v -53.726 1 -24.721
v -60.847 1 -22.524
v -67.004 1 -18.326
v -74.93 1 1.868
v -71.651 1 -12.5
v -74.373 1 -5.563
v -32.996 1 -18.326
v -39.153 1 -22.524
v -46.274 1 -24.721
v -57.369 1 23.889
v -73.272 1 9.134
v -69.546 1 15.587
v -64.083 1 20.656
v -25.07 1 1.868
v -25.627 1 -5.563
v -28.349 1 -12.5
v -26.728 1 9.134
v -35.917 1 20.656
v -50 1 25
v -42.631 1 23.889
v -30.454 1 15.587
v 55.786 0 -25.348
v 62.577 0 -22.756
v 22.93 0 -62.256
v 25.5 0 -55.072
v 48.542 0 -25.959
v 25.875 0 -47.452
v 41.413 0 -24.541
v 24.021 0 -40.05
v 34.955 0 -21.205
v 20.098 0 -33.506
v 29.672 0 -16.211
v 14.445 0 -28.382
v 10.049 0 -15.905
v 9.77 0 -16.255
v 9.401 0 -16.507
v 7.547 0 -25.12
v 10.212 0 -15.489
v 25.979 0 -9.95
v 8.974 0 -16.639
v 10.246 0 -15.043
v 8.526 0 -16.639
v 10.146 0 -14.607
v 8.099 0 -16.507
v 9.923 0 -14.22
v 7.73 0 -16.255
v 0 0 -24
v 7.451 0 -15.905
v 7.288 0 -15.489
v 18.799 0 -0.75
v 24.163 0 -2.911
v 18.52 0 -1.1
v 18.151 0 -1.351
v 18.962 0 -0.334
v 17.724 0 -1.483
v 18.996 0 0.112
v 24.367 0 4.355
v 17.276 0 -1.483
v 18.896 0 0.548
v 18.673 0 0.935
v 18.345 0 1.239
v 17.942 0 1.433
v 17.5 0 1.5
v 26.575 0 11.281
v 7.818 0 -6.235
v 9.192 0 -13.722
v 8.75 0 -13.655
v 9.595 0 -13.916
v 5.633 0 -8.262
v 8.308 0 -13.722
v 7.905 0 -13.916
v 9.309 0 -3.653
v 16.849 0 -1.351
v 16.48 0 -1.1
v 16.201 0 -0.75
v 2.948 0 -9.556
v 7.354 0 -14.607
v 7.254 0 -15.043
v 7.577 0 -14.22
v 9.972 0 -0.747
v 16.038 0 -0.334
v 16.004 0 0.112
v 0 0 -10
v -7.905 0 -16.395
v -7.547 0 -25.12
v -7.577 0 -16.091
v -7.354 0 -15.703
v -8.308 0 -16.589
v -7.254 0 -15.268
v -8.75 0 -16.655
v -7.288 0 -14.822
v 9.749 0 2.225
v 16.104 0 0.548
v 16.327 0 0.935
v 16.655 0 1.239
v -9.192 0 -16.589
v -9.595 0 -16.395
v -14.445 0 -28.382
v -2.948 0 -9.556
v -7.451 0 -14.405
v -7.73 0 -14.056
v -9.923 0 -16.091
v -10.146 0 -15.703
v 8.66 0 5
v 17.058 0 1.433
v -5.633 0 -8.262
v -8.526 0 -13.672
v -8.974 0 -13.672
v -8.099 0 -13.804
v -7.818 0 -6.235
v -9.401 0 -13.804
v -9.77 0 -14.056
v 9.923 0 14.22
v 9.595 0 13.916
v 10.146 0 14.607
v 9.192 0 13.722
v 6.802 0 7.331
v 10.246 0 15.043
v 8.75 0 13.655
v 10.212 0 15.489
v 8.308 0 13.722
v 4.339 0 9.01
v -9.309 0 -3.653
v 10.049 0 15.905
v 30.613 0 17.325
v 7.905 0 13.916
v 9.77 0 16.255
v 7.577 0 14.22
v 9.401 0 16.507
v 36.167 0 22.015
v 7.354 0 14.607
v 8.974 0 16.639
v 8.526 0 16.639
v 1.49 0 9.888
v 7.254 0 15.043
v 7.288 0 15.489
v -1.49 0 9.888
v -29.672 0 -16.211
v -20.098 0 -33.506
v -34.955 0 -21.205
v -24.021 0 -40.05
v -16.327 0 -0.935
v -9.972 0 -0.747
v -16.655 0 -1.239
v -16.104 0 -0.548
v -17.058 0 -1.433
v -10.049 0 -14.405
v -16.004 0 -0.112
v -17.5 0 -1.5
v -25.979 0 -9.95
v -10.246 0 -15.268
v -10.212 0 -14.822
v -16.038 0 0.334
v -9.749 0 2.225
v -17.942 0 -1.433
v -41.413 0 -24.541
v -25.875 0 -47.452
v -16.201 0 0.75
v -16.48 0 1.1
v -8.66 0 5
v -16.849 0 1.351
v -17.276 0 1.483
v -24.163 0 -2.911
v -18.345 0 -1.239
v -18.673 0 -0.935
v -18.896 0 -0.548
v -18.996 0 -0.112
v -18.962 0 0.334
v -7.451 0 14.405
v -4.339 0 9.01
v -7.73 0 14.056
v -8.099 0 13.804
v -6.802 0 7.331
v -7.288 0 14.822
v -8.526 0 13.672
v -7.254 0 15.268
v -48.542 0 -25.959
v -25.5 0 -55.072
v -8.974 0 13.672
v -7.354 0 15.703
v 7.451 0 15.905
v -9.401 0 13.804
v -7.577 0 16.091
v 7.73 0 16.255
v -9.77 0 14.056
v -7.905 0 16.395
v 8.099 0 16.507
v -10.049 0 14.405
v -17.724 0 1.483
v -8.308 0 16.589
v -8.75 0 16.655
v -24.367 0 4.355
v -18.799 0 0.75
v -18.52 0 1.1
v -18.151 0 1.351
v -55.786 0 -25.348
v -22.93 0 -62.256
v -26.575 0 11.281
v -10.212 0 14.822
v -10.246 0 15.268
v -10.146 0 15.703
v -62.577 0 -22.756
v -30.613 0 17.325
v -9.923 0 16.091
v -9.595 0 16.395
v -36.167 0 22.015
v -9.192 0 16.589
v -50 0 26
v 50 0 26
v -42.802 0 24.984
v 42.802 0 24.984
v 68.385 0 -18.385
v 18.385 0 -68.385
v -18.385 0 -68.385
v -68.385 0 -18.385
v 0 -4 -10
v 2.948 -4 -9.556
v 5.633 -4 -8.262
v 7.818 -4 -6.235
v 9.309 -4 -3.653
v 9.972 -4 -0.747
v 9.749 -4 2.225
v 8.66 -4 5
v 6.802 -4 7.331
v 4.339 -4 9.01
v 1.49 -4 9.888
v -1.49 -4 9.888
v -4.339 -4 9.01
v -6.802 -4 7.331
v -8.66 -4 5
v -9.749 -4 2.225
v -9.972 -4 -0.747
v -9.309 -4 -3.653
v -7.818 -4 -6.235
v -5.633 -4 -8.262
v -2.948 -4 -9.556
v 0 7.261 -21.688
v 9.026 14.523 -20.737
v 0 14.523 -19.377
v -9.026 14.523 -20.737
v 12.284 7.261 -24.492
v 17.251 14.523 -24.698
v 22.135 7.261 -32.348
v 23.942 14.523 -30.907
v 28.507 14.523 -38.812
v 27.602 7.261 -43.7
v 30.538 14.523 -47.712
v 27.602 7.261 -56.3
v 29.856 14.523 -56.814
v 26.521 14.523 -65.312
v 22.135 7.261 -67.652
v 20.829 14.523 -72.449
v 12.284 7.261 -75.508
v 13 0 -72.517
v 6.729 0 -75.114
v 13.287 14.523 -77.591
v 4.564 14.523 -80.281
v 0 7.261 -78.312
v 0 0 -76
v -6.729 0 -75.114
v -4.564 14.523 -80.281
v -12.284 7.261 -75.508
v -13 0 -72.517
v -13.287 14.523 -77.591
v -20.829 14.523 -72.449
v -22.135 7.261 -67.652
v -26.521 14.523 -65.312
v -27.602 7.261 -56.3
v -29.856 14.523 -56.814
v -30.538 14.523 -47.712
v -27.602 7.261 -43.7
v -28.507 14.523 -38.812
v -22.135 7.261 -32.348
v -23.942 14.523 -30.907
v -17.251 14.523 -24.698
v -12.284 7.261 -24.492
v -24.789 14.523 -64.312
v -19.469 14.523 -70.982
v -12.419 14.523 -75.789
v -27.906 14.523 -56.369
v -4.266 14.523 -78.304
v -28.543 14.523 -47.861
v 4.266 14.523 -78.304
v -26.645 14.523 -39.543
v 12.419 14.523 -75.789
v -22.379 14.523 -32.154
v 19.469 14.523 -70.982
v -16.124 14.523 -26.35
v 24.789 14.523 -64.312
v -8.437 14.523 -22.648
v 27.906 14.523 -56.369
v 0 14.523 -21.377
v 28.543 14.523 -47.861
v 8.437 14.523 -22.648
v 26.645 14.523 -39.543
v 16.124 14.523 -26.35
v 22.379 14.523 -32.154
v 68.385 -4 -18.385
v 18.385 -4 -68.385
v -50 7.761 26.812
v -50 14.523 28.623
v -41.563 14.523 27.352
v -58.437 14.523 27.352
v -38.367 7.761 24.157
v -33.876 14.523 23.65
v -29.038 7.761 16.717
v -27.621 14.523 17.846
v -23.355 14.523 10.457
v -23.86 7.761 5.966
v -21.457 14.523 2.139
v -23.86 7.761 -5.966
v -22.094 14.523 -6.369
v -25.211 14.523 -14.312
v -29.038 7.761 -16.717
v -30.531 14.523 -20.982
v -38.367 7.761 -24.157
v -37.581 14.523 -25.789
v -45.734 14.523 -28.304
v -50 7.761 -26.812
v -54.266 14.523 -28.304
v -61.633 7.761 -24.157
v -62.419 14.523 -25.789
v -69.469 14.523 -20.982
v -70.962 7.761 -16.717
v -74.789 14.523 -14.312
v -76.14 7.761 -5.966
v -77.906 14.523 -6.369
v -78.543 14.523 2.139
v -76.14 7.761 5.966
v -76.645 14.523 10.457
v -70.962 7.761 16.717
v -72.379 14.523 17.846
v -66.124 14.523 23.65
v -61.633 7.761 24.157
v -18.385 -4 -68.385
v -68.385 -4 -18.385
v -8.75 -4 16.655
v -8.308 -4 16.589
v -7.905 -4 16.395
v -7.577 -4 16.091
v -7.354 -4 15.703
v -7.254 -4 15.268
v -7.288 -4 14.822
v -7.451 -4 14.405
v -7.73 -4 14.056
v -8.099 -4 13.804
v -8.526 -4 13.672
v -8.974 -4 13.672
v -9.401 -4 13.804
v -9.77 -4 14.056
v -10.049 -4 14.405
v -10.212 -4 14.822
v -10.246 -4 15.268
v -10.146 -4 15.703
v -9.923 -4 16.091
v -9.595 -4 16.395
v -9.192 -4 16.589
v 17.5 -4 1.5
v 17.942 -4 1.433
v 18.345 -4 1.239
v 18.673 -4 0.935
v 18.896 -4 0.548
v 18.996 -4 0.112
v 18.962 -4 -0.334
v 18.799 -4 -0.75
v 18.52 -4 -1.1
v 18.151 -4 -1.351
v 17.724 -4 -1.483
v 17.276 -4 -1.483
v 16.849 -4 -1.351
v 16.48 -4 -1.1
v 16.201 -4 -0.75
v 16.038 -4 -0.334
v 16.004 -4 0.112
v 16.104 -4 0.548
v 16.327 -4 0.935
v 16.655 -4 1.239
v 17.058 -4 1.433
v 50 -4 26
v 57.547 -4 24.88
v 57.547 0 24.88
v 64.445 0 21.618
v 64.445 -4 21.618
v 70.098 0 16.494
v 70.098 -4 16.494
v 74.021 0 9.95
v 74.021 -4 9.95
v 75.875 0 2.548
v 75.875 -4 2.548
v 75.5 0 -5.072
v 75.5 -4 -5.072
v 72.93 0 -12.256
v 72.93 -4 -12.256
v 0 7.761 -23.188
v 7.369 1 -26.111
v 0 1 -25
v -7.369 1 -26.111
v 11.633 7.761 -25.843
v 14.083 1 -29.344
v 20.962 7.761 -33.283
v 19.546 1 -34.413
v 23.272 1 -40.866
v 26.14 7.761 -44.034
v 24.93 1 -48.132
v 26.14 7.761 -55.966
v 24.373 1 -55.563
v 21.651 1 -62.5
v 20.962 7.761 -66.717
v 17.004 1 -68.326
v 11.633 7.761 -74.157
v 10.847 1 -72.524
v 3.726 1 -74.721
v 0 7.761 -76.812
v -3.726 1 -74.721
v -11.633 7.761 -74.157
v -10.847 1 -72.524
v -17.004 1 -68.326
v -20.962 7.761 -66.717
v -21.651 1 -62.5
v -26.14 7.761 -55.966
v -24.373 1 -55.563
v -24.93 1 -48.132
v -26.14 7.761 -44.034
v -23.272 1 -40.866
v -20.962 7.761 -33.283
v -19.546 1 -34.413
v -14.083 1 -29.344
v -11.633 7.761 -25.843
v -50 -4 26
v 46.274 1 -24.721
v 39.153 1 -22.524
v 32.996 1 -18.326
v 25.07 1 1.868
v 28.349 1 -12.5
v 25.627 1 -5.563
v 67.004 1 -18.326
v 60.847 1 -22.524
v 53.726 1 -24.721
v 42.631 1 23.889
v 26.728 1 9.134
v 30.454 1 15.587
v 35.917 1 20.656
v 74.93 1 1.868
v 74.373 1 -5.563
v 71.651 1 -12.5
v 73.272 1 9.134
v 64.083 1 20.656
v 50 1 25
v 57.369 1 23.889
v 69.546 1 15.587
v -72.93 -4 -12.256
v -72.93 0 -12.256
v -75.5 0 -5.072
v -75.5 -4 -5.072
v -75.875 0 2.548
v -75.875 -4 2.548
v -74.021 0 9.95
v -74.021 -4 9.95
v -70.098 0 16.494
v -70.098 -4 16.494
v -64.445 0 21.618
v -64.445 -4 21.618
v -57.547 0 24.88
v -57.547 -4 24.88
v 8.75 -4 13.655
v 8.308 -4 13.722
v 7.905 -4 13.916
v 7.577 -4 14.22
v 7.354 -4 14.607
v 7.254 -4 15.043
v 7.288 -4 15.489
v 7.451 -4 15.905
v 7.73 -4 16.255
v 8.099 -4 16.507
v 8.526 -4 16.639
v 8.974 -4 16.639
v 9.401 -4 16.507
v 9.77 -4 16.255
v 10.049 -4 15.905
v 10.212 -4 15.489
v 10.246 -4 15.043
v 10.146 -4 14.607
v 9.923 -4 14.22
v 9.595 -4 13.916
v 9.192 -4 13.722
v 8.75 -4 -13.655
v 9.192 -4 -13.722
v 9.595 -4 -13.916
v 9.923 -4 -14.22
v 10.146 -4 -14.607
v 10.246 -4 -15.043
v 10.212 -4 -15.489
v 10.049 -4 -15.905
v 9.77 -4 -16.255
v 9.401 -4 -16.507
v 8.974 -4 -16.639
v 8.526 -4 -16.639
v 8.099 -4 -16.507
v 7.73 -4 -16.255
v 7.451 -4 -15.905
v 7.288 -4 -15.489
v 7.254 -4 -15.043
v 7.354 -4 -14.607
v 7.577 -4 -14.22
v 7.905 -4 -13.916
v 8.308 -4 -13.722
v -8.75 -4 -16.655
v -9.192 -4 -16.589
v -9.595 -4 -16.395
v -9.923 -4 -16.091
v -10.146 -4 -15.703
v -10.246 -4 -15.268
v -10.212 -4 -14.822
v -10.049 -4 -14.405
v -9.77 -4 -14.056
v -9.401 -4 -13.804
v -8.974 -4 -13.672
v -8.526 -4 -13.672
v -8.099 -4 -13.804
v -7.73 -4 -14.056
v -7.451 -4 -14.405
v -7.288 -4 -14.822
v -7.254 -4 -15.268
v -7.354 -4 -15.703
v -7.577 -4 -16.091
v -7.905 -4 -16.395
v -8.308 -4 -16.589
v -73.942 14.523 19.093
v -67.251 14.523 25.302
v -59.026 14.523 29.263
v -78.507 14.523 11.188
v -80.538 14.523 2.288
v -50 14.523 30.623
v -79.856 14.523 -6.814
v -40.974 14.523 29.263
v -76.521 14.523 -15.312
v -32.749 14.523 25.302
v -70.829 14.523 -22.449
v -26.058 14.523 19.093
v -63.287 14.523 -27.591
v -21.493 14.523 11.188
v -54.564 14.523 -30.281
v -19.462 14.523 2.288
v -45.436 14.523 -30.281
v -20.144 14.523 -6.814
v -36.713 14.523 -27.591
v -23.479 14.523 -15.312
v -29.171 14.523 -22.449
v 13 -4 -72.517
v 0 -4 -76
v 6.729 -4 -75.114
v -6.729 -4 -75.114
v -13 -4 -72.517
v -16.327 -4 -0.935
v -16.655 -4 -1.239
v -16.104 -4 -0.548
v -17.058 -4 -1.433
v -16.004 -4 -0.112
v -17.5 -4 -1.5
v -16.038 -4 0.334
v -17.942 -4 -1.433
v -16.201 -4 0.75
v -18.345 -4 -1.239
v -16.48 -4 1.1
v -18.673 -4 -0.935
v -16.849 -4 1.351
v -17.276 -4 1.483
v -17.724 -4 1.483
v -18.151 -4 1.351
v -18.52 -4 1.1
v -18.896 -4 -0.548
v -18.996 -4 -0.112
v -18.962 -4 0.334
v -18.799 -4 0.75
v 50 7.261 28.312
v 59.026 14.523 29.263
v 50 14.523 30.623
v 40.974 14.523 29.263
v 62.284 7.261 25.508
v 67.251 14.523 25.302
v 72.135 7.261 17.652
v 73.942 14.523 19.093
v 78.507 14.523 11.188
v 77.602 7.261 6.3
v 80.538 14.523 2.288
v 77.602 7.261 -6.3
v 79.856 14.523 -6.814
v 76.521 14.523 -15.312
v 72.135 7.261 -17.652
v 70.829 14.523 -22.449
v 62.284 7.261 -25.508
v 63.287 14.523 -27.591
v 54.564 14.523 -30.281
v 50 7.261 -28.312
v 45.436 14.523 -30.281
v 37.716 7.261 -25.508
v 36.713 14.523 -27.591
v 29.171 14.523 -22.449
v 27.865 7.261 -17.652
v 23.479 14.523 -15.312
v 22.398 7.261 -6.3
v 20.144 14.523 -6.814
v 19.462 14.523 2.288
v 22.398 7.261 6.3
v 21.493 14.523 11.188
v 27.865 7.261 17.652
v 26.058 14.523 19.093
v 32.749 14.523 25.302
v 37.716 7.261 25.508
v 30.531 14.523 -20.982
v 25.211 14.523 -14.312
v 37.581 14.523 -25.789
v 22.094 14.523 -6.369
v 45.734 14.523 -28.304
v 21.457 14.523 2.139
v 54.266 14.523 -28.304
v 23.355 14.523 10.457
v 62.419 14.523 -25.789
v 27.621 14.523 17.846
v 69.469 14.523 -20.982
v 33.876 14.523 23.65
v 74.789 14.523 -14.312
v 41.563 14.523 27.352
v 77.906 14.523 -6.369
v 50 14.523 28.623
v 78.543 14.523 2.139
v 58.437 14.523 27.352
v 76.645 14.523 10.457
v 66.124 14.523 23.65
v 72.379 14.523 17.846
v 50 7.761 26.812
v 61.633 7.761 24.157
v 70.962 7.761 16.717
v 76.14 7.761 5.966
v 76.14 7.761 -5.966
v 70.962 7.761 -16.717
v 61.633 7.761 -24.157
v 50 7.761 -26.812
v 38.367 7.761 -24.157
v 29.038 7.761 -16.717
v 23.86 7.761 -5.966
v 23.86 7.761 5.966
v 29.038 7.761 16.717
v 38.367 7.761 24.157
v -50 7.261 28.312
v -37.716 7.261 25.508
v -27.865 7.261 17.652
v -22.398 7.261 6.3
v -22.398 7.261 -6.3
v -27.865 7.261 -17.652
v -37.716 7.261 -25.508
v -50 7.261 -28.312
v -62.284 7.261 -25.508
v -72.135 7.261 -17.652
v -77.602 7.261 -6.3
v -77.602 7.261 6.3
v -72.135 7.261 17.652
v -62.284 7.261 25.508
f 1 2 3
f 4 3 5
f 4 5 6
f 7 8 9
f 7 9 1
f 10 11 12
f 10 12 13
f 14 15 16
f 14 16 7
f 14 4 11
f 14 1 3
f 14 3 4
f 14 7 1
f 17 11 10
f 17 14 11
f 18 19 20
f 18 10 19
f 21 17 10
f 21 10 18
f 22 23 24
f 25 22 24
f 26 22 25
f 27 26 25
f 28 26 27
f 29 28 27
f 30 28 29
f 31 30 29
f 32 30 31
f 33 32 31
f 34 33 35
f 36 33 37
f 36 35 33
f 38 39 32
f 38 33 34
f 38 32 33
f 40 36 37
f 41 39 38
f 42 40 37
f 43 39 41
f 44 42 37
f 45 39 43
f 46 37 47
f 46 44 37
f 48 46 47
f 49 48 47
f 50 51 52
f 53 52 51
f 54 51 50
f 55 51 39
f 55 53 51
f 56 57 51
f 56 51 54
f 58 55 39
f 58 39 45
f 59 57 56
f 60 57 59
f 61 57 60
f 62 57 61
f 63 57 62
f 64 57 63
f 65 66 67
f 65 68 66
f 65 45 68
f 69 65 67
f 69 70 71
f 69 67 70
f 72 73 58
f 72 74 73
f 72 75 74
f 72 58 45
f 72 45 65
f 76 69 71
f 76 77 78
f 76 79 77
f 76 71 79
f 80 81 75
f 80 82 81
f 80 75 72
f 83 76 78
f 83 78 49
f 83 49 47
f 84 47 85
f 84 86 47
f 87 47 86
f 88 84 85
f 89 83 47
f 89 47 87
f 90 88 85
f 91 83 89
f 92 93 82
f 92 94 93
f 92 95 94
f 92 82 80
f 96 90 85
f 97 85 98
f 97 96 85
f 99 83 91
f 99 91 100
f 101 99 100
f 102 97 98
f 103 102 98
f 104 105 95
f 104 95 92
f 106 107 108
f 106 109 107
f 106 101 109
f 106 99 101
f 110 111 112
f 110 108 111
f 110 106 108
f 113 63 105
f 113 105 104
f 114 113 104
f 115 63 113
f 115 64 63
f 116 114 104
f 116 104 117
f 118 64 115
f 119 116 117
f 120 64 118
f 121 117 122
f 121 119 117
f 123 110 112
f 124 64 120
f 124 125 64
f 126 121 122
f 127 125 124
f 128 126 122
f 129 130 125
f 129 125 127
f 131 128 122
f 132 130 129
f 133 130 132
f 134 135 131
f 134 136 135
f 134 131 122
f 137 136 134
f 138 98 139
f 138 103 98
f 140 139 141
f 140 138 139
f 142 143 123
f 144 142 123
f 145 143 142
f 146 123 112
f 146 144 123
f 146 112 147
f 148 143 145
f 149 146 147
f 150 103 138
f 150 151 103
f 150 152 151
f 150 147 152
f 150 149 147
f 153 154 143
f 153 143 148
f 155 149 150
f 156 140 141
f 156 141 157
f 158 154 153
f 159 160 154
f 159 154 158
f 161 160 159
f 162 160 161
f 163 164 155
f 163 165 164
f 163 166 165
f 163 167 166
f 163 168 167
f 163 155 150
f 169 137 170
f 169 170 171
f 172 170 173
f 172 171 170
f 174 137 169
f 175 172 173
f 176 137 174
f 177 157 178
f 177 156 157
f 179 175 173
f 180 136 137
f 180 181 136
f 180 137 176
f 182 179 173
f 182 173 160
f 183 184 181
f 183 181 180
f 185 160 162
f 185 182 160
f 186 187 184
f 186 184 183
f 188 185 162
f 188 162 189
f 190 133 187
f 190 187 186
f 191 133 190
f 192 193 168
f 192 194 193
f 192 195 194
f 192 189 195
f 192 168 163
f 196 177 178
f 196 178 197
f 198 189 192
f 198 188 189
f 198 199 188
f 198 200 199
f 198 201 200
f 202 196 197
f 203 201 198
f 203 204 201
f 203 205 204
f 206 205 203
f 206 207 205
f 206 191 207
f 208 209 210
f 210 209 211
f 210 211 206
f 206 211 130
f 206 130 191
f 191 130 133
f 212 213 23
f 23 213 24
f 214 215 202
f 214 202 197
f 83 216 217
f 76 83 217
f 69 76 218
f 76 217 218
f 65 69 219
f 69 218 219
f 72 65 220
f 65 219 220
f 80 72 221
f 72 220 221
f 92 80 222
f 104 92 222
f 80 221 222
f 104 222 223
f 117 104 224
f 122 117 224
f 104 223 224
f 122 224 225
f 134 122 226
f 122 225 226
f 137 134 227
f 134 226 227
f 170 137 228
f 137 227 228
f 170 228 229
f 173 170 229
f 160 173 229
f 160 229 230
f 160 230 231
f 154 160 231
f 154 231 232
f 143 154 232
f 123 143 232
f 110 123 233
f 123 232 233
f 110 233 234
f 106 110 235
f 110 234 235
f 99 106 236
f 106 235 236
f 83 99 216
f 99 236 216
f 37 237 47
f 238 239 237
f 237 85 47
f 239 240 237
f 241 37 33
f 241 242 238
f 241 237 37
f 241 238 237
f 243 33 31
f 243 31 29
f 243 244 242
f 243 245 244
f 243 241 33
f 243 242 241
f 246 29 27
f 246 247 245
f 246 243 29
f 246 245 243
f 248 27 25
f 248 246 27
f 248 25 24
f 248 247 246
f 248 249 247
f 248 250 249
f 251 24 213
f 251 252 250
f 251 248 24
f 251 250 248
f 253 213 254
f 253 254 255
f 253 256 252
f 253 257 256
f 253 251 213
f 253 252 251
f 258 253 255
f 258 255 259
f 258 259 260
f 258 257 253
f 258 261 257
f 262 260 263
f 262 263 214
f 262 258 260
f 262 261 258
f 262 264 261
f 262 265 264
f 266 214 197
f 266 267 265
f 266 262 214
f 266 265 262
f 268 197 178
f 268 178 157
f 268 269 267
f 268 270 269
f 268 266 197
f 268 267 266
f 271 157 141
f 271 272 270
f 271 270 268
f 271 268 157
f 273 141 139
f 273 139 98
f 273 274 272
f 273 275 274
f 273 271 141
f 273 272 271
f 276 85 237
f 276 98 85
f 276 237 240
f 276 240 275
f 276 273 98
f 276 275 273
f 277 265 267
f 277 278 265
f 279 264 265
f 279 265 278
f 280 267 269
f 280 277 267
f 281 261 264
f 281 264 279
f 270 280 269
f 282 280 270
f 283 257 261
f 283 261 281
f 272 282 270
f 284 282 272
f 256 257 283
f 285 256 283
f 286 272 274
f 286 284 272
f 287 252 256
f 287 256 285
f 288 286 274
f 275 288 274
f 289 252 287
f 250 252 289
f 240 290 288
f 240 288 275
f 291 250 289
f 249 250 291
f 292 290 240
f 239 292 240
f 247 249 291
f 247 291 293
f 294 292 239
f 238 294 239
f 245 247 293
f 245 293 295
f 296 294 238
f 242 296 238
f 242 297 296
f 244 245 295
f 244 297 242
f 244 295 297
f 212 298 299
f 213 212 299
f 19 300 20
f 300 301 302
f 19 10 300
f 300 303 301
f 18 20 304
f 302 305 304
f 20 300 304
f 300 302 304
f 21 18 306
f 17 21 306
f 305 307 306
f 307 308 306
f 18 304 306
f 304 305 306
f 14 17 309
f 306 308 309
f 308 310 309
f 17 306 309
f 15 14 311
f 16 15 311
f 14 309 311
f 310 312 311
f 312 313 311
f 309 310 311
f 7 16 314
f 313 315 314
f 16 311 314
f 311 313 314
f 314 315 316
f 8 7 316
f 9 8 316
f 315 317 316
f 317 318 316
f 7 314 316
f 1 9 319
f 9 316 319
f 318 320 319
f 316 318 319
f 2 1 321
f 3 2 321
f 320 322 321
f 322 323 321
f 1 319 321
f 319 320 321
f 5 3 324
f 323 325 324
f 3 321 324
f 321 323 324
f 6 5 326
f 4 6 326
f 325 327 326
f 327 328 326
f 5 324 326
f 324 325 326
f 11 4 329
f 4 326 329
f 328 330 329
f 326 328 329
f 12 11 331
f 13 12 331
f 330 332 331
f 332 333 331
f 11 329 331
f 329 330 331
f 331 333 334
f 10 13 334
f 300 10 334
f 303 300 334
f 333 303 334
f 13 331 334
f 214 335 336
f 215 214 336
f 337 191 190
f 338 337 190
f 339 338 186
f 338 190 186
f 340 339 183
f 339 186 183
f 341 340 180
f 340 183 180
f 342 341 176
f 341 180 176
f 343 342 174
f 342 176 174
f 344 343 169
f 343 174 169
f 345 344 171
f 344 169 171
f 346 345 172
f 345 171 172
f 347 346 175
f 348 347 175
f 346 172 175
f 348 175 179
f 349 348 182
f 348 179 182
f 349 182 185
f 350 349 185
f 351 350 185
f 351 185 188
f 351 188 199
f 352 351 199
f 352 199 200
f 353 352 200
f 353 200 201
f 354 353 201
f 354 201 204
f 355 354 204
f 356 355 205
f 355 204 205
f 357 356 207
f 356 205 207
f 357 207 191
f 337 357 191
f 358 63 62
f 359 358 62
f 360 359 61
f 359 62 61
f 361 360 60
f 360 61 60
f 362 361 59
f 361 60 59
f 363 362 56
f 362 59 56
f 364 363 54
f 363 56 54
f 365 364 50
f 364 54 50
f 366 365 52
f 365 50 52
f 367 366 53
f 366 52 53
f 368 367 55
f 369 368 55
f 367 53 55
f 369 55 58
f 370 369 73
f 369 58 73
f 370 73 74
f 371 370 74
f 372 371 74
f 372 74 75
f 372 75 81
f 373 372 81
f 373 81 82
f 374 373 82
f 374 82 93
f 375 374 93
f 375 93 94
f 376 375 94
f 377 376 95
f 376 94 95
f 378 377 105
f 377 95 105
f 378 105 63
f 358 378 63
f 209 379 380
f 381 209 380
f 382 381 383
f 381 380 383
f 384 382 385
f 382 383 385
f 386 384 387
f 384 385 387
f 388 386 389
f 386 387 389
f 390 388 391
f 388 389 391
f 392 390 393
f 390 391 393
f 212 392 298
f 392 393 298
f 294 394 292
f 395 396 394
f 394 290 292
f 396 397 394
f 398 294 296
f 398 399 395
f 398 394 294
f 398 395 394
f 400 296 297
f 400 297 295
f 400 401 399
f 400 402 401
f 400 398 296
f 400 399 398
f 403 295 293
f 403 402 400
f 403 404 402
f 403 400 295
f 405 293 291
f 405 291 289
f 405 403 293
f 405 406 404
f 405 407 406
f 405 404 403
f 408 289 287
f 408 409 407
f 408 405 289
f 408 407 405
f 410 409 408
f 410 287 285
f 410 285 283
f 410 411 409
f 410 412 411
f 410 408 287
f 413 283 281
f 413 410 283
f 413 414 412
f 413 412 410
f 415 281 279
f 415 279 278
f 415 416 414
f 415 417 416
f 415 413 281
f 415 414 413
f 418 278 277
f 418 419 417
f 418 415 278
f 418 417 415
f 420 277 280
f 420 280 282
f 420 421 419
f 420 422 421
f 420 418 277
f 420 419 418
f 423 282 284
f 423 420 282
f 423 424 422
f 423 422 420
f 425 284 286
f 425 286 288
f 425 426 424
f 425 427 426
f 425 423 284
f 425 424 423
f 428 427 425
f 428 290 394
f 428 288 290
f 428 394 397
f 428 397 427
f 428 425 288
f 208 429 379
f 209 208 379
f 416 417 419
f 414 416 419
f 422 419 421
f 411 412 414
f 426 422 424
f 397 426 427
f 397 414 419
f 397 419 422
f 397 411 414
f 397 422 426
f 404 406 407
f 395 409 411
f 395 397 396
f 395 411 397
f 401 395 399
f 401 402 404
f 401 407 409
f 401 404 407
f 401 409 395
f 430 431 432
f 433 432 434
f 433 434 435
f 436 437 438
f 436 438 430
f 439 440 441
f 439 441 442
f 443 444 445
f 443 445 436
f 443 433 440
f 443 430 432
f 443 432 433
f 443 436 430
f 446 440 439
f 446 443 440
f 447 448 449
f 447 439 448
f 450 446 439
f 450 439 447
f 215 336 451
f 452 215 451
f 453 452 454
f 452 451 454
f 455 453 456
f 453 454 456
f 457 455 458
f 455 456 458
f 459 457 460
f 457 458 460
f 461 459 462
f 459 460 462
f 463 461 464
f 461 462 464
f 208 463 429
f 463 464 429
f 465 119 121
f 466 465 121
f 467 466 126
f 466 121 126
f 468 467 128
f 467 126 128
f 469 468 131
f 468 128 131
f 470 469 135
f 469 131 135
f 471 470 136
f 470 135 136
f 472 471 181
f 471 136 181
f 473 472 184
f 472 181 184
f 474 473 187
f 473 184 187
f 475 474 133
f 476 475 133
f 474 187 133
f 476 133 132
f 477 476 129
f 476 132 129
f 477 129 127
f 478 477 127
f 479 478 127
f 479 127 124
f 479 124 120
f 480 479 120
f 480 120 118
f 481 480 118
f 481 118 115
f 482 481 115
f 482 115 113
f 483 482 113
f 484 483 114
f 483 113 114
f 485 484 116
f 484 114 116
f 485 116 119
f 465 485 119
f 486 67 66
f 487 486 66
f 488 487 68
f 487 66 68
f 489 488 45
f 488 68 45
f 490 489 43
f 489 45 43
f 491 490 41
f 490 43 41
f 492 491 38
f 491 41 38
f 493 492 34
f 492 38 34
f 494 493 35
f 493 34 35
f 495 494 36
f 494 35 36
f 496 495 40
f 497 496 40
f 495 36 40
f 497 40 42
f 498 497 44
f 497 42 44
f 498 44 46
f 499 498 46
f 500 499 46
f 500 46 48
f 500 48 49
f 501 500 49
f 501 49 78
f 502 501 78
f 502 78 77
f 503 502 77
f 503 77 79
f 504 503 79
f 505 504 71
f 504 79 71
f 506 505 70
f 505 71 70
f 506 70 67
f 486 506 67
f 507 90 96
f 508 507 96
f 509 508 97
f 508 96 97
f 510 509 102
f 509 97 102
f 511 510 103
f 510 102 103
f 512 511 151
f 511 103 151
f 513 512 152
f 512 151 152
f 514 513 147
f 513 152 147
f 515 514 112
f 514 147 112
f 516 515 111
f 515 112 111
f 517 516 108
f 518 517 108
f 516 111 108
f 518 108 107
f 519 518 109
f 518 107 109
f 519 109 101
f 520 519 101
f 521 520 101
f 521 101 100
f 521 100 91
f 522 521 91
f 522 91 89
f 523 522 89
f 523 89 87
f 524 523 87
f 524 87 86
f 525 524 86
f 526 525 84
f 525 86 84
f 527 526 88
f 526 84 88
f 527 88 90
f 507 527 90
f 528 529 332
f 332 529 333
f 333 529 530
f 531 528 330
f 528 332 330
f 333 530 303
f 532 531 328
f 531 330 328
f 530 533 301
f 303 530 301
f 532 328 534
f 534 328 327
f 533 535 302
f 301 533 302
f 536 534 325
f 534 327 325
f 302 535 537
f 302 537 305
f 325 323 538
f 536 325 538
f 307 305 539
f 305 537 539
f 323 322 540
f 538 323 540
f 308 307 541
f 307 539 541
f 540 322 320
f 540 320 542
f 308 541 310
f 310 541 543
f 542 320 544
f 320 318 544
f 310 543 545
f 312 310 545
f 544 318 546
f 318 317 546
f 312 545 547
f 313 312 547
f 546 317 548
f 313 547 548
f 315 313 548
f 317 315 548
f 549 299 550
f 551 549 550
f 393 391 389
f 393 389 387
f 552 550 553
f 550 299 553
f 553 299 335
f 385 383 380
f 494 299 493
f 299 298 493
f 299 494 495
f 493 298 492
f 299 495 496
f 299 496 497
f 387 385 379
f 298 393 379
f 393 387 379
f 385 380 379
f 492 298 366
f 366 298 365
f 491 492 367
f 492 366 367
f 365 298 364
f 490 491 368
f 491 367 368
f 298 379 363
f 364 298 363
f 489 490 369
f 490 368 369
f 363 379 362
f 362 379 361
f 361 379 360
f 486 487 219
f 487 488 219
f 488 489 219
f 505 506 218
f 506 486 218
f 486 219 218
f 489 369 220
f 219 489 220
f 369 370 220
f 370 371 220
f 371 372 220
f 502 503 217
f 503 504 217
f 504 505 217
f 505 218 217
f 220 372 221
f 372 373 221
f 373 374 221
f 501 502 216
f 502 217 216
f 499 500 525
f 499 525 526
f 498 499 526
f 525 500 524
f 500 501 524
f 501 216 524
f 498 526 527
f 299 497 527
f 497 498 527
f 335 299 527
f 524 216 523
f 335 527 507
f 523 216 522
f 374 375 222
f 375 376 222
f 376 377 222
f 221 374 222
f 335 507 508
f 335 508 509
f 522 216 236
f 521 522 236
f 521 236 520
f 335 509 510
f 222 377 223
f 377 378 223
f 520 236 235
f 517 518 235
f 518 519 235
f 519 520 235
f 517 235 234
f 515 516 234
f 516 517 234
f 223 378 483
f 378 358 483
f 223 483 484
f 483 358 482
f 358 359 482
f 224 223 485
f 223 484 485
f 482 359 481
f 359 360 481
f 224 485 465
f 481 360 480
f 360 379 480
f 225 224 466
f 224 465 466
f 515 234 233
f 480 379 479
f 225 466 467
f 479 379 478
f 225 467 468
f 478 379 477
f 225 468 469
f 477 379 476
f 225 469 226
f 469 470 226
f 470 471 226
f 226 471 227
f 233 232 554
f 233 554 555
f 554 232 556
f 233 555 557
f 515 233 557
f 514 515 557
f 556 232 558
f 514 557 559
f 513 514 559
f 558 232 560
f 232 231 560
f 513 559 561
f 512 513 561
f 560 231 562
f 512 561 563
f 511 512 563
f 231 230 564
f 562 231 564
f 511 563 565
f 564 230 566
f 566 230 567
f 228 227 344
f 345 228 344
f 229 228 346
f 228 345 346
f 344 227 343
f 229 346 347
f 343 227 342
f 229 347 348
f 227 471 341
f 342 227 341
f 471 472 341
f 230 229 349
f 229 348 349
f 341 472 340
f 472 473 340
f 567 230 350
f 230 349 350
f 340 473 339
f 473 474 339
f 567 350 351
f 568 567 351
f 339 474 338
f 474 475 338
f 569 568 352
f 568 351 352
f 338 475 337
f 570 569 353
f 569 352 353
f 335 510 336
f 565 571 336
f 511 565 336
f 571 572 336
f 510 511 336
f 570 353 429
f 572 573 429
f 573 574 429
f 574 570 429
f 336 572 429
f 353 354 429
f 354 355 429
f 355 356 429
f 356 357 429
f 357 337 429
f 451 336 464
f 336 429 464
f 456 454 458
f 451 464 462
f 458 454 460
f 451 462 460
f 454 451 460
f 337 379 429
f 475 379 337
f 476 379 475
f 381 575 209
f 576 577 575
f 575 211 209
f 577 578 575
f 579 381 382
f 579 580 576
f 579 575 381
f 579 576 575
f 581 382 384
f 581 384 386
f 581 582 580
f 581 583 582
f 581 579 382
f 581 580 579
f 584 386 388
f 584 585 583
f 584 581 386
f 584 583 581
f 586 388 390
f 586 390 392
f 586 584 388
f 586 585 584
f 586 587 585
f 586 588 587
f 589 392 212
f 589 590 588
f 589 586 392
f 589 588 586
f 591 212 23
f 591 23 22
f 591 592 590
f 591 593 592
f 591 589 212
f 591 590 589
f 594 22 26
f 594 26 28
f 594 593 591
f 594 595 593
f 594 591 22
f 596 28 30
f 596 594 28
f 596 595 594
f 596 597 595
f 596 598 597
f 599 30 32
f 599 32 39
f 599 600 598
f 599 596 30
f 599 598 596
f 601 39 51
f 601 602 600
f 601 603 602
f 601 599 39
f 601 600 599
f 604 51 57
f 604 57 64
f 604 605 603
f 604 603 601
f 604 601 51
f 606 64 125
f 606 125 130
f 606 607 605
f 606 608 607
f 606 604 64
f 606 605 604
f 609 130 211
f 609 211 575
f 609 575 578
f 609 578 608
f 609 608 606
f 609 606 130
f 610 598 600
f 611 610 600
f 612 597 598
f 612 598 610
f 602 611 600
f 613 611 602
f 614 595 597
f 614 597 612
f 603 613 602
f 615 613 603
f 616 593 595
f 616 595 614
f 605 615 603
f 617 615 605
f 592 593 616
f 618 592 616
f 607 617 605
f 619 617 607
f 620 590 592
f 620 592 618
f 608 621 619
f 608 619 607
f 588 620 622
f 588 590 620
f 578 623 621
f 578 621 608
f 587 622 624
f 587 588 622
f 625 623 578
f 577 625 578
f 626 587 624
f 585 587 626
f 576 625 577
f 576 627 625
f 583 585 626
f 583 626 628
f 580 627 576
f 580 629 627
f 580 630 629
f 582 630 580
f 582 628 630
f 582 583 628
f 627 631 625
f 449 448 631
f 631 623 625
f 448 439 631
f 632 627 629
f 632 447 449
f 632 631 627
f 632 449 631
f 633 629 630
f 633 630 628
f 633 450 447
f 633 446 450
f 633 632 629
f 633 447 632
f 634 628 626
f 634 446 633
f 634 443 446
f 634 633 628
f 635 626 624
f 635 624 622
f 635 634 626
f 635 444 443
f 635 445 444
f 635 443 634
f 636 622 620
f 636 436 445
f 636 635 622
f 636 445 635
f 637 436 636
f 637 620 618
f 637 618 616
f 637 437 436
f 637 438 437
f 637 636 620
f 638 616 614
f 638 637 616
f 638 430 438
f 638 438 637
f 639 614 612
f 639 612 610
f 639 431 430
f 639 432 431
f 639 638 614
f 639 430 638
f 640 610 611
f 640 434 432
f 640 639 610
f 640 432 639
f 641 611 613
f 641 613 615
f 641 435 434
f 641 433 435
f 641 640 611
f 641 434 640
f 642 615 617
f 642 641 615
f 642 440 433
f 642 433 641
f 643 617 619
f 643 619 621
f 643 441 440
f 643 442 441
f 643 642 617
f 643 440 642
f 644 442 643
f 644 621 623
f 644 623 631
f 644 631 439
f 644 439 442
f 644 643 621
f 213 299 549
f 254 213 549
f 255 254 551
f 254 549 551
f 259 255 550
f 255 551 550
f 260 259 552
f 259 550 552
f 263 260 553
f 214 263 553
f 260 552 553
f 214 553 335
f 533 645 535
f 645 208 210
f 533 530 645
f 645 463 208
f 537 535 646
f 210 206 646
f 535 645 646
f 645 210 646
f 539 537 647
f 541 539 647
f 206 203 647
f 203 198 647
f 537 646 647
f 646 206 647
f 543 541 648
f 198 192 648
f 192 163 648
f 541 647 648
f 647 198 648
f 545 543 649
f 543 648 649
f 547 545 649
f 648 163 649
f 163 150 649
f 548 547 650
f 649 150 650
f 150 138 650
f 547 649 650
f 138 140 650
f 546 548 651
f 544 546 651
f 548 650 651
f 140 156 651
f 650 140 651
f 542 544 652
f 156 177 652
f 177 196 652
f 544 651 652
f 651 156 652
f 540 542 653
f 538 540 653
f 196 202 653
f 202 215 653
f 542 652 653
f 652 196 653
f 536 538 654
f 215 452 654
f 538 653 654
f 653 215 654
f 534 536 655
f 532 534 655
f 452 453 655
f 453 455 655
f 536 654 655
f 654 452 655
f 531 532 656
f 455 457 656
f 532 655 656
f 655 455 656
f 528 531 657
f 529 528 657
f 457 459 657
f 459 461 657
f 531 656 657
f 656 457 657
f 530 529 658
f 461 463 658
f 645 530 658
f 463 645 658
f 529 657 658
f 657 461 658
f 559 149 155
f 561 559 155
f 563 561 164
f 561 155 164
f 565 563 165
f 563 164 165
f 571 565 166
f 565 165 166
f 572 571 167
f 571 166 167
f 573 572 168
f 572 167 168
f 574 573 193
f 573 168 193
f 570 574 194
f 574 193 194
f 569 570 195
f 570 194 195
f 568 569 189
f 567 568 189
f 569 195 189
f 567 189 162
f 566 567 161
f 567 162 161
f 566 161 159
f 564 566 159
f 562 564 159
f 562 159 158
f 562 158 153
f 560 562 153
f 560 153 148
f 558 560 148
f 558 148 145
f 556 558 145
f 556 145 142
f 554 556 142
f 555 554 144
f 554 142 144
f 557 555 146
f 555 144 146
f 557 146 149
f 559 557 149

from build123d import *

# Parameters (mm, degrees)
SKETCH_1_R          = 26
EXTRUDE_1_DEPTH     = 1
EXTRUDE_1_2_DEPTH   = 1
EXTRUDE_1_3_DEPTH   = 1
EXTRUDE_START       = 4
SKETCH_2_R          = 10
EXTRUDE_2_DEPTH     = 4
SKETCH_3_R          = 1.5
CUT_EXTRUDE_1_DEPTH = 4


with BuildPart() as part:
    # 草图1 → 凸台-拉伸1 (new body)
    with BuildSketch(Plane(origin=(0, 0, 0), x_dir=(1, 0, 0), z_dir=(0, 1, 0))):
        with Locations(Location((0, 50, 0), (0, 0, 270))):
            Circle(SKETCH_1_R)
    extrude(amount=EXTRUDE_1_DEPTH)



with BuildPart() as body_2:
    # 草图1 → Extrude 1 2 (new body)
    with BuildSketch(Plane(origin=(0, 0, 0), x_dir=(1, 0, 0), z_dir=(0, 1, 0))):
        with Locations(Location((50, 0, 0), (0, 0, 270))):
            Circle(SKETCH_1_R)
    extrude(amount=EXTRUDE_1_2_DEPTH)


with BuildPart() as body_3:
    # 草图1 → Extrude 1 3 (new body)
    with BuildSketch(Plane(origin=(0, 0, 0), x_dir=(1, 0, 0), z_dir=(0, 1, 0))):
        with Locations(Location((-50, 0, 0), (0, 0, 270))):
            Circle(SKETCH_1_R)
    extrude(amount=EXTRUDE_1_3_DEPTH)


with BuildPart() as part_1:
    add(part.part)

    add(body_2.part)  # 凸台-拉伸2 merges body 2

    add(body_3.part)  # 凸台-拉伸2 merges body 3
    # 草图2 → 凸台-拉伸2 (add)
    with BuildSketch(Plane.XZ.offset(EXTRUDE_START)):
        with BuildLine():
            Line((-50, 26), (50, 26))
            ThreePointArc((50, 26), (74.020867845, 9.949769241), (68.384776311, -18.384776311))
            Line((68.384776311, -18.384776311), (18.384776311, -68.384776311))
            ThreePointArc((18.384776311, -68.384776311), (0, -76), (-18.384776311, -68.384776311))
            Line((-18.384776311, -68.384776311), (-68.384776311, -18.384776311))
            ThreePointArc((-68.384776311, -18.384776311), (-74.020867845, 9.949769241), (-50, 26))
        make_face()
        with Locations(Location((0, 0, 0), (0, 0, 270))):
            Circle(SKETCH_2_R, mode=Mode.SUBTRACT)
    extrude(amount=-EXTRUDE_2_DEPTH)

    # 草图3 → 切除-拉伸1 (cut)
    with BuildSketch(Plane(origin=(0, 0, 0), x_dir=(1, 0, 0), z_dir=(0, 1, 0))):
        with Locations(Location((8.75, 15.155444566, 0), (0, 0, 270))):
            Circle(SKETCH_3_R)
        with Locations(Location((17.5, 0, 0), (0, 0, 270))):
            Circle(SKETCH_3_R)
        with Locations(Location((-17.5, 0, 0), (0, 0, 90))):
            Circle(SKETCH_3_R)
        with Locations(Location((-8.75, 15.155444566, 0), (0, 0, 90))):
            Circle(SKETCH_3_R)
        with Locations(Location((-8.75, -15.155444566, 0), (0, 0, 270))):
            Circle(SKETCH_3_R)
        with Locations(Location((8.75, -15.155444566, 0), (0, 0, 90))):
            Circle(SKETCH_3_R)
    extrude(amount=-CUT_EXTRUDE_1_DEPTH, mode=Mode.SUBTRACT)

    # 草图4 → 旋转1 (revolve)
    with BuildSketch(Plane(origin=(0, 0, 0), x_dir=(0, 0, -1), z_dir=(1, 0, 0)), mode=Mode.PRIVATE) as revolve_1_sk:
        Polygon((80.623466631, 14.522961568), (78.623466631, 14.522961568), (75, 1), (76, 1), (76, 0), align=None)
    revolve(revolve_1_sk.sketch.rotate(Axis((0, 1, -50), (0, 1, 0)), 180), axis=Axis((0, 1, -50), (0, 1, 0)))

    # 草图6 → 旋转2 (revolve)
    with BuildSketch(Plane.XY, mode=Mode.PRIVATE) as revolve_2_sk:
        Polygon((-75, 1), (-78.623466631, 14.522961568), (-80.623466631, 14.522961568), (-76, 0), (-76, 1), align=None)
    revolve(revolve_2_sk.sketch.rotate(Axis((-50, 1, 0), (0, 1, 0)), 90), axis=Axis((-50, 1, 0), (0, 1, 0)))

    # 草图7 → 旋转3 (revolve)
    with BuildSketch(Plane.XY, mode=Mode.PRIVATE) as revolve_3_sk:
        Polygon((75, 1), (76, 1), (76, 0), (80.623466631, 14.522961568), (78.623466631, 14.522961568), align=None)
    revolve(revolve_3_sk.sketch.rotate(Axis((50, 1, 0), (0, 1, 0)), 270), axis=Axis((50, 1, 0), (0, 1, 0)))


solid = part_1.part
